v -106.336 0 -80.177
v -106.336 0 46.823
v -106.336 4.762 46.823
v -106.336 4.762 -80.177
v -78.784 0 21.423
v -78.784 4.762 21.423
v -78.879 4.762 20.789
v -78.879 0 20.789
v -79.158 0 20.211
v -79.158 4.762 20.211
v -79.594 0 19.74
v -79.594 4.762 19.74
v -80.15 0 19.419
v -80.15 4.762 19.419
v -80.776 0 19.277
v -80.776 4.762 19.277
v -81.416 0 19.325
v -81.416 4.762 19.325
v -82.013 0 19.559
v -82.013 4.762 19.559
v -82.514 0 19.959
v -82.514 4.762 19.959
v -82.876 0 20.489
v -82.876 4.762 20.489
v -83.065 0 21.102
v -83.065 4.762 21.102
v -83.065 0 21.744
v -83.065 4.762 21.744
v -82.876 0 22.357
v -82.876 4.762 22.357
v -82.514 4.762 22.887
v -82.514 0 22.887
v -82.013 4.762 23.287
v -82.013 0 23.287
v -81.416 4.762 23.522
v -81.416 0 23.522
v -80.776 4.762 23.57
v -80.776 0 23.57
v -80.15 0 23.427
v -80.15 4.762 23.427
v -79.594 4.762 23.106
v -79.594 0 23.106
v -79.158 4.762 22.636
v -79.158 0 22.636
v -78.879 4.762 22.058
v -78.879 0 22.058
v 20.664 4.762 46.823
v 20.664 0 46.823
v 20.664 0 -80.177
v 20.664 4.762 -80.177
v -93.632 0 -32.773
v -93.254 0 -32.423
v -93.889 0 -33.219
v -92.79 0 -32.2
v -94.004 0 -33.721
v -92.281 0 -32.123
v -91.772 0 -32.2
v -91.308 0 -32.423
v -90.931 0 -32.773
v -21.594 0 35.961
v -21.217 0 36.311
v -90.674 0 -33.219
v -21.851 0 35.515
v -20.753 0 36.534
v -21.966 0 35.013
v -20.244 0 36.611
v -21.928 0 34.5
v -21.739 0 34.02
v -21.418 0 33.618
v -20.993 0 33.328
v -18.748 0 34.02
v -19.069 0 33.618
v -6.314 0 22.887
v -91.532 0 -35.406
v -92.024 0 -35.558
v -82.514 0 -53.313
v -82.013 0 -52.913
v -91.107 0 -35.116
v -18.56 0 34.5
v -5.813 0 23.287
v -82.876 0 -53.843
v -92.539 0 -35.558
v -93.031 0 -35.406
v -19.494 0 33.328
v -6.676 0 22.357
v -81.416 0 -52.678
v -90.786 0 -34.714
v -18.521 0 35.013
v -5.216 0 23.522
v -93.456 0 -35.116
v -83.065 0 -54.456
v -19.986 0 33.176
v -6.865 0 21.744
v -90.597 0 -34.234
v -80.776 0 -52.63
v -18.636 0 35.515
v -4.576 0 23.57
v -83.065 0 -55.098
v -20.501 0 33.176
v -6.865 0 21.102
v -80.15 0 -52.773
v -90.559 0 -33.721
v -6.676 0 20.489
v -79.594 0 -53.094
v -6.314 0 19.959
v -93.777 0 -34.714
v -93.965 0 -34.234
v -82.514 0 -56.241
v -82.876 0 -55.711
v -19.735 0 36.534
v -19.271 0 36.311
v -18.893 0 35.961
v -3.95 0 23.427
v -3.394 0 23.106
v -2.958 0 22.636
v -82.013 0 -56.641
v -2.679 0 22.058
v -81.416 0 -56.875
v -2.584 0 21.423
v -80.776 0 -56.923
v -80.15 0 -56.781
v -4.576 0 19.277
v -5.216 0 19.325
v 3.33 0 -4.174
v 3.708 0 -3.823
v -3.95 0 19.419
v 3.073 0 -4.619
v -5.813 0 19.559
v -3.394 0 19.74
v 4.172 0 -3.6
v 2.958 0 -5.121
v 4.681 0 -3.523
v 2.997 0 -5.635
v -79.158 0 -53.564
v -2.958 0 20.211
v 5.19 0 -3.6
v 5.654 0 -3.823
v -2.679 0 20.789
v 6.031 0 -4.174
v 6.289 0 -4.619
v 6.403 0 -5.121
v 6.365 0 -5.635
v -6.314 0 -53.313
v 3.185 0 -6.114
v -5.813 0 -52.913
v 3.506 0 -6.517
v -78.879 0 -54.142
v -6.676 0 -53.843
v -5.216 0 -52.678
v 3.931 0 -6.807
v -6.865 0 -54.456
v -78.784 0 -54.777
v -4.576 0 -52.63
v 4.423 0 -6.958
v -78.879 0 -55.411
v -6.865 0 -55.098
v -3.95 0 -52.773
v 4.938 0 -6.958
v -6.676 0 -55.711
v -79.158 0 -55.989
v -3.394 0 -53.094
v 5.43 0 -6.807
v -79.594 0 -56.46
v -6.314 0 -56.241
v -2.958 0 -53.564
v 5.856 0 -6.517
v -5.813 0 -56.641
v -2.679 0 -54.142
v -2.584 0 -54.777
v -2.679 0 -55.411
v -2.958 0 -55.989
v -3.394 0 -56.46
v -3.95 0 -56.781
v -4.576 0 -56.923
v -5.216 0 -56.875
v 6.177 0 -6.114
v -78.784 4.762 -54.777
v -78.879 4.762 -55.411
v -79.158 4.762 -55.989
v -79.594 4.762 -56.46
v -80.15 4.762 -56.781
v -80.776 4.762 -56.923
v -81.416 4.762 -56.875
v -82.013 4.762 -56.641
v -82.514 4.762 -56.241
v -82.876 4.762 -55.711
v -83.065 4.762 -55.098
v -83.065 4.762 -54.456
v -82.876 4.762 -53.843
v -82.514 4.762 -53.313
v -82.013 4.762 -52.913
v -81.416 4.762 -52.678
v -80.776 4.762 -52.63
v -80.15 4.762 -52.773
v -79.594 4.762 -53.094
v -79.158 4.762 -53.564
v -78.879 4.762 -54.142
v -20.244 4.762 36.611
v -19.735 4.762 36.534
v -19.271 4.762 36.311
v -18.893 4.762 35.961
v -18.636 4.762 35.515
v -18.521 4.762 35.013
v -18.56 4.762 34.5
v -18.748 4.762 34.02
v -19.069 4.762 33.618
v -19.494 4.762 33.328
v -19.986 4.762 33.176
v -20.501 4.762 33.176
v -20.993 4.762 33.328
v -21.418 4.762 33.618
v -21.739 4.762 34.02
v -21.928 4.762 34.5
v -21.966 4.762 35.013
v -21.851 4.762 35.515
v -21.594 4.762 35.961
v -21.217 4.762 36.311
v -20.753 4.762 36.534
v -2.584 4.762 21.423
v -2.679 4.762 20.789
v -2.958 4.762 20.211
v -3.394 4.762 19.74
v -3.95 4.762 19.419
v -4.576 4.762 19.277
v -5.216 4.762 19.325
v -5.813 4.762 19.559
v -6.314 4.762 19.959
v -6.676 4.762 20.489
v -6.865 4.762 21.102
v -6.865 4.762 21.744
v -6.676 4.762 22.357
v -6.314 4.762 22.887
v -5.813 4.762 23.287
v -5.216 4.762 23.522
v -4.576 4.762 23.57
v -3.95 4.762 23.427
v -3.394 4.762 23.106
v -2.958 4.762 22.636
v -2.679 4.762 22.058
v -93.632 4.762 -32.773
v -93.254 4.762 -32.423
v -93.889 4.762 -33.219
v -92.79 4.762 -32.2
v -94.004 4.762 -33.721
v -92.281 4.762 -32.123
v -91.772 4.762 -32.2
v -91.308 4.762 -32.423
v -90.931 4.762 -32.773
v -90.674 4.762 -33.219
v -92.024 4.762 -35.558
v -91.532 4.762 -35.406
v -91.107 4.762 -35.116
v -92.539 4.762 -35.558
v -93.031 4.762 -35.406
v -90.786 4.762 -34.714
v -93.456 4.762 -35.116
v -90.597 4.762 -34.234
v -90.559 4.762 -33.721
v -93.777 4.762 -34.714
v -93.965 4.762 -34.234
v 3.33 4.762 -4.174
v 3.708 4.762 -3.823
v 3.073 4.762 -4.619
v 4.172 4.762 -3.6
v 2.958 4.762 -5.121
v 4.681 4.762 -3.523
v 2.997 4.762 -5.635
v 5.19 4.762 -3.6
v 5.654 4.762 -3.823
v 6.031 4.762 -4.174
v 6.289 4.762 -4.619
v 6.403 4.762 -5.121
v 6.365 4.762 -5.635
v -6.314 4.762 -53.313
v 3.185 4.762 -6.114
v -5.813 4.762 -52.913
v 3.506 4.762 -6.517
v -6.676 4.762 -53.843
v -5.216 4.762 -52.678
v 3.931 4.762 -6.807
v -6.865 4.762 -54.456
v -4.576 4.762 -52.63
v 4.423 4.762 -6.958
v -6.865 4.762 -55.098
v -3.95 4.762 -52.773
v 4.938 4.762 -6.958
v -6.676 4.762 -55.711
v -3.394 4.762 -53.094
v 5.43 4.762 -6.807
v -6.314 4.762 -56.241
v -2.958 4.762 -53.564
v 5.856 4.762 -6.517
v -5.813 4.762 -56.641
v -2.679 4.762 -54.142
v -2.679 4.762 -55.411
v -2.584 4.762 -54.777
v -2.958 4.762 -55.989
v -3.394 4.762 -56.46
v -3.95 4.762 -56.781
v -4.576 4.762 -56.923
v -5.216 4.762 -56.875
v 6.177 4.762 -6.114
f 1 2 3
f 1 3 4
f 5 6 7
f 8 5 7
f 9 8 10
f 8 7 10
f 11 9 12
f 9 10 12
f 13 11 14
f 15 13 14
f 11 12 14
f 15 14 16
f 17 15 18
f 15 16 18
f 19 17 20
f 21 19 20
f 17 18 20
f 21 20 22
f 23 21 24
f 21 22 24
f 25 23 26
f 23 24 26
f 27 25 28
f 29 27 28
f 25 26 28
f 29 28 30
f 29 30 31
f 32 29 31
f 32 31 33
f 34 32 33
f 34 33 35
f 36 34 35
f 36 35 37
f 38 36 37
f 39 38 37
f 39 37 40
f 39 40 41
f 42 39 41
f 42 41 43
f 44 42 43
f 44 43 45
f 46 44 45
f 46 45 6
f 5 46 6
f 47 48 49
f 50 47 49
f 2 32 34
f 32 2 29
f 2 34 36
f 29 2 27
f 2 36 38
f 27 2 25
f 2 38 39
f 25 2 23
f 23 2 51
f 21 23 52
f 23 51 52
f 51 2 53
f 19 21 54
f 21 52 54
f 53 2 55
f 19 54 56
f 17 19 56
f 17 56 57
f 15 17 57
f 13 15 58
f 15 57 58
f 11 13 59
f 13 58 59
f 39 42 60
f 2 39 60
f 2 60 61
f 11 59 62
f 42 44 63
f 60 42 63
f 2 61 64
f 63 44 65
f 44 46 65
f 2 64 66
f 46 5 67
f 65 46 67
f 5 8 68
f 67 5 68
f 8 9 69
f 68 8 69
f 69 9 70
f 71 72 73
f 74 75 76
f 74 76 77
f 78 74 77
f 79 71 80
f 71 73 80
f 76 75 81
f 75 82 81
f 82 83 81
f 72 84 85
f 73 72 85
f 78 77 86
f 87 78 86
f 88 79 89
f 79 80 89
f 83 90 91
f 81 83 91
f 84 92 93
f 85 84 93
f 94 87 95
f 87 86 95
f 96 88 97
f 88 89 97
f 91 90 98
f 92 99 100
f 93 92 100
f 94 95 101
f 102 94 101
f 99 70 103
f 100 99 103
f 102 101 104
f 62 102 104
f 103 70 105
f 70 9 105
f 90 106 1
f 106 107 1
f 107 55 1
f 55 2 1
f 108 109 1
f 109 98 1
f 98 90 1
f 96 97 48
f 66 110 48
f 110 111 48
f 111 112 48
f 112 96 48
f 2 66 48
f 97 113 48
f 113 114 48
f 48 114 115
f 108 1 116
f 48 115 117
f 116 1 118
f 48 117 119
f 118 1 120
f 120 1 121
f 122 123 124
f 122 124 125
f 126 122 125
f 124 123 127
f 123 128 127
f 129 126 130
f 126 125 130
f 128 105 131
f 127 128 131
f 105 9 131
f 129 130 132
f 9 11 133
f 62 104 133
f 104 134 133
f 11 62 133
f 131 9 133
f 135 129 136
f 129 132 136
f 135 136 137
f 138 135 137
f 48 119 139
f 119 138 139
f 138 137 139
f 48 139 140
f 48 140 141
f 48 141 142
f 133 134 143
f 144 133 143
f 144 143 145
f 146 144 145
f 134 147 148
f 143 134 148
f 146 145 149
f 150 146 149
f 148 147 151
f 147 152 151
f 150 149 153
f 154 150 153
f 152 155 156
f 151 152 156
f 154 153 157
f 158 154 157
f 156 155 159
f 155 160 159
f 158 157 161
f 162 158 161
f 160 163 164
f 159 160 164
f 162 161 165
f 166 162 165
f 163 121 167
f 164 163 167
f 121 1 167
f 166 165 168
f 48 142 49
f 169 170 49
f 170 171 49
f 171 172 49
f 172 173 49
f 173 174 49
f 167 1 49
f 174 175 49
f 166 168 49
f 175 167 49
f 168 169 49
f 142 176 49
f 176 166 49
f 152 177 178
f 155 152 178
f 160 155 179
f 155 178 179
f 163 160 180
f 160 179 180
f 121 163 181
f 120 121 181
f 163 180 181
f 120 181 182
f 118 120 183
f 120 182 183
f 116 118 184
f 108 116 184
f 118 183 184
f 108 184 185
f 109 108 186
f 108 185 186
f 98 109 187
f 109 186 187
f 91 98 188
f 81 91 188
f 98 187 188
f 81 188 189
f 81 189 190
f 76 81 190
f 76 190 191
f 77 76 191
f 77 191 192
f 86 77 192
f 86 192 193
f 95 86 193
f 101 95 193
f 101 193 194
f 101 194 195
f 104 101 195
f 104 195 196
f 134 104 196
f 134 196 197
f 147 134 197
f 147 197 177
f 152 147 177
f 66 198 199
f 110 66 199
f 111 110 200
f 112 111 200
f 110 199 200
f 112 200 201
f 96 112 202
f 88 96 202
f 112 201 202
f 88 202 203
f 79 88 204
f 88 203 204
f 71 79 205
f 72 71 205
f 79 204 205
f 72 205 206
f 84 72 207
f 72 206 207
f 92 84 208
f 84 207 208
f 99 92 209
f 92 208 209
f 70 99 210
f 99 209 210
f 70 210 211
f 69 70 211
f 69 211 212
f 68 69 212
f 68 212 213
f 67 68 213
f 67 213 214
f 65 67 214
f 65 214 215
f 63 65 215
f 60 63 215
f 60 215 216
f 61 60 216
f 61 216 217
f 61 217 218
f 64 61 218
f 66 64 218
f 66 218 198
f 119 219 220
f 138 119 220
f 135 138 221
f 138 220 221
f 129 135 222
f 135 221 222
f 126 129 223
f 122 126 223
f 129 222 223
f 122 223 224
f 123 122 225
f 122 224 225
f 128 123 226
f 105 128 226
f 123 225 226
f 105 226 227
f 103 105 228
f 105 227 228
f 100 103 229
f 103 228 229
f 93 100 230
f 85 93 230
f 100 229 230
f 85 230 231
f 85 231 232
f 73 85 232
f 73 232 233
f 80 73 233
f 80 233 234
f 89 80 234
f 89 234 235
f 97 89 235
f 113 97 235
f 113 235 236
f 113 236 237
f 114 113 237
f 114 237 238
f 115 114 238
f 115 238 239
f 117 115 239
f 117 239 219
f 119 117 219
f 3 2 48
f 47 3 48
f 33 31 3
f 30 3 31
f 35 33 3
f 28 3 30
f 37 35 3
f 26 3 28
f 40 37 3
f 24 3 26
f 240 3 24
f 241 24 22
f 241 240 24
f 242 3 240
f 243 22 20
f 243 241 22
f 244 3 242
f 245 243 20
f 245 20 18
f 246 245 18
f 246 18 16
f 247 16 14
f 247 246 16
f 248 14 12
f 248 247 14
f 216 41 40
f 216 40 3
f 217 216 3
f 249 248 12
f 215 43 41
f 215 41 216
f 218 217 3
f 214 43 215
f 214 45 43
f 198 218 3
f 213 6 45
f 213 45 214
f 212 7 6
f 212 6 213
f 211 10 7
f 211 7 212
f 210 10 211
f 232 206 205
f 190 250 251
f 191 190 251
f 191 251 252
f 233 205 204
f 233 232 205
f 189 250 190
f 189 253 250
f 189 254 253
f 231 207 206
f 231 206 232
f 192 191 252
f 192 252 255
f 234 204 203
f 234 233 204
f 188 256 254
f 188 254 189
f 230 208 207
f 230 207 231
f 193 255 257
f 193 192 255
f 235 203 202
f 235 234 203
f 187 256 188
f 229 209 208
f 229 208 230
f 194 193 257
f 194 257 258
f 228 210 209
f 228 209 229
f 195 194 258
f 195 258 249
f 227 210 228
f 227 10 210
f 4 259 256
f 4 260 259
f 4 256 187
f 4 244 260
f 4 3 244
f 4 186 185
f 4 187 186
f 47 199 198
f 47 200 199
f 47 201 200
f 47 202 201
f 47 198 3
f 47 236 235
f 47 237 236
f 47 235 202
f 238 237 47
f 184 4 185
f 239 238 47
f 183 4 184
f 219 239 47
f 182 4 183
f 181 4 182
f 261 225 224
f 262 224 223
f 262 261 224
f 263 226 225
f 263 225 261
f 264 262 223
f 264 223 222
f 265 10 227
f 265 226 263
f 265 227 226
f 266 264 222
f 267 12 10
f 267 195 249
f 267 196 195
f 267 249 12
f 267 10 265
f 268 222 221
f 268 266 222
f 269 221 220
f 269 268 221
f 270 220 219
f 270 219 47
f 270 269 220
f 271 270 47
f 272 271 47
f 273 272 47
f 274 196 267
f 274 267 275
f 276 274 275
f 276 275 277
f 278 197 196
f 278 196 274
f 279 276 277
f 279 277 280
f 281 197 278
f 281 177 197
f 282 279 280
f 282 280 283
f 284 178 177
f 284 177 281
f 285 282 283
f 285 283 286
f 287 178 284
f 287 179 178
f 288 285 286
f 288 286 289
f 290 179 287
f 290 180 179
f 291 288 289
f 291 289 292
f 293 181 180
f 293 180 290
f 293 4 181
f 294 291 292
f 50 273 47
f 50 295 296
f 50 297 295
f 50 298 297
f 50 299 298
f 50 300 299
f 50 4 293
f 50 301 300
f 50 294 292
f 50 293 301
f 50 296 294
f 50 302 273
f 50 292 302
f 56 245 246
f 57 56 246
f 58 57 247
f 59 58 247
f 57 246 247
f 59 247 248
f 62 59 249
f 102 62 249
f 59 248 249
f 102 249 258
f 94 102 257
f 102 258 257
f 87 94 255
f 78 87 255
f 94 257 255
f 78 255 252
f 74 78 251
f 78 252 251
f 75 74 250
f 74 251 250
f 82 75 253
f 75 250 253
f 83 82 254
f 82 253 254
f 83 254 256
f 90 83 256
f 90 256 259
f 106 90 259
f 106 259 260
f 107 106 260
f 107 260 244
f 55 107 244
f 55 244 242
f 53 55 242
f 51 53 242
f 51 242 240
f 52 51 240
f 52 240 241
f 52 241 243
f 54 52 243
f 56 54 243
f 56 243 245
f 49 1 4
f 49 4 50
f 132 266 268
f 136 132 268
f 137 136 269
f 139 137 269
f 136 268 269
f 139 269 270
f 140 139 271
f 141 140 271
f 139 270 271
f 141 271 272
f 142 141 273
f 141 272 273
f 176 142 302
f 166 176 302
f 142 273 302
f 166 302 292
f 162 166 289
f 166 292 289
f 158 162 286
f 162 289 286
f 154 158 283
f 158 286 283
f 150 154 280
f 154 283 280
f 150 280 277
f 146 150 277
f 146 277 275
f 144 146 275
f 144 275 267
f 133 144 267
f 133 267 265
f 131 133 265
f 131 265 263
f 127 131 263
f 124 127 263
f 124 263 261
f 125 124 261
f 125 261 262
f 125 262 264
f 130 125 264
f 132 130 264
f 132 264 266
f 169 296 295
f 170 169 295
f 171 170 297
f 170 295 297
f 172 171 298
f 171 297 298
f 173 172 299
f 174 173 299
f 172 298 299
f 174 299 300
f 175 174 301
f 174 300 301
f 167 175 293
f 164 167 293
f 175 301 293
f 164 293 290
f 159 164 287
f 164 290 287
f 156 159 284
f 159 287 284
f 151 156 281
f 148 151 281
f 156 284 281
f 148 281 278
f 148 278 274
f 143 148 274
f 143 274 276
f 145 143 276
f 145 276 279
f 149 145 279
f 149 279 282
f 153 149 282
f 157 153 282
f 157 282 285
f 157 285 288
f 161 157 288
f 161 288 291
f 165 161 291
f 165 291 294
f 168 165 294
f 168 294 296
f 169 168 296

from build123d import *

# Parameters (mm, degrees)
SKETCH1_W                    = 127
SKETCH1_H                    = 127
BOSS_EXTRUDE1_DEPTH          = 4.7625
SKETCH3_R                    = 1.7272
CUT_EXTRUDE2_DEPTH           = 134.260815846
F_18_0_1695_DIAMETER_HOLE1_D = 4.3053


with BuildPart() as part:
    # Sketch1 → Boss-Extrude1 (new body)
    with BuildSketch(Plane(origin=(0, 0, 0), x_dir=(1, 0, 0), z_dir=(0, 1, 0))):
        with Locations((-42.83649213, 16.676767677)):
            Rectangle(SKETCH1_W, SKETCH1_H)
    extrude(amount=BOSS_EXTRUDE1_DEPTH)

    # Sketch3 → Cut-Extrude2 (cut, through all)
    with BuildSketch(Plane(origin=(0, 4.7625, 0), x_dir=(1, 0, 0), z_dir=(0, 1, 0))):
        with Locations(Location((-92.281344473, 33.850048251, 0), (0, 0, 270))):
            Circle(SKETCH3_R)
        with Locations(Location((4.680777484, 5.250408923, 0), (0, 0, 270))):
            Circle(SKETCH3_R)
        with Locations(Location((-20.243685744, -34.883948787, 0), (0, 0, 270))):
            Circle(SKETCH3_R)
    extrude(amount=-CUT_EXTRUDE2_DEPTH, mode=Mode.SUBTRACT)

    # #18 (0.1695) Diameter Hole1 (through all)
    with Locations(Plane(origin=(0, 0, 0), x_dir=(-1, 0, 0), z_dir=(0, -1, 0))):
        with Locations((80.93649213, -21.423232323), (80.93649213, 54.776767677), (4.73649213, -21.423232323), (4.73649213, 54.776767677)):
            Hole(F_18_0_1695_DIAMETER_HOLE1_D / 2)


solid = part.part
